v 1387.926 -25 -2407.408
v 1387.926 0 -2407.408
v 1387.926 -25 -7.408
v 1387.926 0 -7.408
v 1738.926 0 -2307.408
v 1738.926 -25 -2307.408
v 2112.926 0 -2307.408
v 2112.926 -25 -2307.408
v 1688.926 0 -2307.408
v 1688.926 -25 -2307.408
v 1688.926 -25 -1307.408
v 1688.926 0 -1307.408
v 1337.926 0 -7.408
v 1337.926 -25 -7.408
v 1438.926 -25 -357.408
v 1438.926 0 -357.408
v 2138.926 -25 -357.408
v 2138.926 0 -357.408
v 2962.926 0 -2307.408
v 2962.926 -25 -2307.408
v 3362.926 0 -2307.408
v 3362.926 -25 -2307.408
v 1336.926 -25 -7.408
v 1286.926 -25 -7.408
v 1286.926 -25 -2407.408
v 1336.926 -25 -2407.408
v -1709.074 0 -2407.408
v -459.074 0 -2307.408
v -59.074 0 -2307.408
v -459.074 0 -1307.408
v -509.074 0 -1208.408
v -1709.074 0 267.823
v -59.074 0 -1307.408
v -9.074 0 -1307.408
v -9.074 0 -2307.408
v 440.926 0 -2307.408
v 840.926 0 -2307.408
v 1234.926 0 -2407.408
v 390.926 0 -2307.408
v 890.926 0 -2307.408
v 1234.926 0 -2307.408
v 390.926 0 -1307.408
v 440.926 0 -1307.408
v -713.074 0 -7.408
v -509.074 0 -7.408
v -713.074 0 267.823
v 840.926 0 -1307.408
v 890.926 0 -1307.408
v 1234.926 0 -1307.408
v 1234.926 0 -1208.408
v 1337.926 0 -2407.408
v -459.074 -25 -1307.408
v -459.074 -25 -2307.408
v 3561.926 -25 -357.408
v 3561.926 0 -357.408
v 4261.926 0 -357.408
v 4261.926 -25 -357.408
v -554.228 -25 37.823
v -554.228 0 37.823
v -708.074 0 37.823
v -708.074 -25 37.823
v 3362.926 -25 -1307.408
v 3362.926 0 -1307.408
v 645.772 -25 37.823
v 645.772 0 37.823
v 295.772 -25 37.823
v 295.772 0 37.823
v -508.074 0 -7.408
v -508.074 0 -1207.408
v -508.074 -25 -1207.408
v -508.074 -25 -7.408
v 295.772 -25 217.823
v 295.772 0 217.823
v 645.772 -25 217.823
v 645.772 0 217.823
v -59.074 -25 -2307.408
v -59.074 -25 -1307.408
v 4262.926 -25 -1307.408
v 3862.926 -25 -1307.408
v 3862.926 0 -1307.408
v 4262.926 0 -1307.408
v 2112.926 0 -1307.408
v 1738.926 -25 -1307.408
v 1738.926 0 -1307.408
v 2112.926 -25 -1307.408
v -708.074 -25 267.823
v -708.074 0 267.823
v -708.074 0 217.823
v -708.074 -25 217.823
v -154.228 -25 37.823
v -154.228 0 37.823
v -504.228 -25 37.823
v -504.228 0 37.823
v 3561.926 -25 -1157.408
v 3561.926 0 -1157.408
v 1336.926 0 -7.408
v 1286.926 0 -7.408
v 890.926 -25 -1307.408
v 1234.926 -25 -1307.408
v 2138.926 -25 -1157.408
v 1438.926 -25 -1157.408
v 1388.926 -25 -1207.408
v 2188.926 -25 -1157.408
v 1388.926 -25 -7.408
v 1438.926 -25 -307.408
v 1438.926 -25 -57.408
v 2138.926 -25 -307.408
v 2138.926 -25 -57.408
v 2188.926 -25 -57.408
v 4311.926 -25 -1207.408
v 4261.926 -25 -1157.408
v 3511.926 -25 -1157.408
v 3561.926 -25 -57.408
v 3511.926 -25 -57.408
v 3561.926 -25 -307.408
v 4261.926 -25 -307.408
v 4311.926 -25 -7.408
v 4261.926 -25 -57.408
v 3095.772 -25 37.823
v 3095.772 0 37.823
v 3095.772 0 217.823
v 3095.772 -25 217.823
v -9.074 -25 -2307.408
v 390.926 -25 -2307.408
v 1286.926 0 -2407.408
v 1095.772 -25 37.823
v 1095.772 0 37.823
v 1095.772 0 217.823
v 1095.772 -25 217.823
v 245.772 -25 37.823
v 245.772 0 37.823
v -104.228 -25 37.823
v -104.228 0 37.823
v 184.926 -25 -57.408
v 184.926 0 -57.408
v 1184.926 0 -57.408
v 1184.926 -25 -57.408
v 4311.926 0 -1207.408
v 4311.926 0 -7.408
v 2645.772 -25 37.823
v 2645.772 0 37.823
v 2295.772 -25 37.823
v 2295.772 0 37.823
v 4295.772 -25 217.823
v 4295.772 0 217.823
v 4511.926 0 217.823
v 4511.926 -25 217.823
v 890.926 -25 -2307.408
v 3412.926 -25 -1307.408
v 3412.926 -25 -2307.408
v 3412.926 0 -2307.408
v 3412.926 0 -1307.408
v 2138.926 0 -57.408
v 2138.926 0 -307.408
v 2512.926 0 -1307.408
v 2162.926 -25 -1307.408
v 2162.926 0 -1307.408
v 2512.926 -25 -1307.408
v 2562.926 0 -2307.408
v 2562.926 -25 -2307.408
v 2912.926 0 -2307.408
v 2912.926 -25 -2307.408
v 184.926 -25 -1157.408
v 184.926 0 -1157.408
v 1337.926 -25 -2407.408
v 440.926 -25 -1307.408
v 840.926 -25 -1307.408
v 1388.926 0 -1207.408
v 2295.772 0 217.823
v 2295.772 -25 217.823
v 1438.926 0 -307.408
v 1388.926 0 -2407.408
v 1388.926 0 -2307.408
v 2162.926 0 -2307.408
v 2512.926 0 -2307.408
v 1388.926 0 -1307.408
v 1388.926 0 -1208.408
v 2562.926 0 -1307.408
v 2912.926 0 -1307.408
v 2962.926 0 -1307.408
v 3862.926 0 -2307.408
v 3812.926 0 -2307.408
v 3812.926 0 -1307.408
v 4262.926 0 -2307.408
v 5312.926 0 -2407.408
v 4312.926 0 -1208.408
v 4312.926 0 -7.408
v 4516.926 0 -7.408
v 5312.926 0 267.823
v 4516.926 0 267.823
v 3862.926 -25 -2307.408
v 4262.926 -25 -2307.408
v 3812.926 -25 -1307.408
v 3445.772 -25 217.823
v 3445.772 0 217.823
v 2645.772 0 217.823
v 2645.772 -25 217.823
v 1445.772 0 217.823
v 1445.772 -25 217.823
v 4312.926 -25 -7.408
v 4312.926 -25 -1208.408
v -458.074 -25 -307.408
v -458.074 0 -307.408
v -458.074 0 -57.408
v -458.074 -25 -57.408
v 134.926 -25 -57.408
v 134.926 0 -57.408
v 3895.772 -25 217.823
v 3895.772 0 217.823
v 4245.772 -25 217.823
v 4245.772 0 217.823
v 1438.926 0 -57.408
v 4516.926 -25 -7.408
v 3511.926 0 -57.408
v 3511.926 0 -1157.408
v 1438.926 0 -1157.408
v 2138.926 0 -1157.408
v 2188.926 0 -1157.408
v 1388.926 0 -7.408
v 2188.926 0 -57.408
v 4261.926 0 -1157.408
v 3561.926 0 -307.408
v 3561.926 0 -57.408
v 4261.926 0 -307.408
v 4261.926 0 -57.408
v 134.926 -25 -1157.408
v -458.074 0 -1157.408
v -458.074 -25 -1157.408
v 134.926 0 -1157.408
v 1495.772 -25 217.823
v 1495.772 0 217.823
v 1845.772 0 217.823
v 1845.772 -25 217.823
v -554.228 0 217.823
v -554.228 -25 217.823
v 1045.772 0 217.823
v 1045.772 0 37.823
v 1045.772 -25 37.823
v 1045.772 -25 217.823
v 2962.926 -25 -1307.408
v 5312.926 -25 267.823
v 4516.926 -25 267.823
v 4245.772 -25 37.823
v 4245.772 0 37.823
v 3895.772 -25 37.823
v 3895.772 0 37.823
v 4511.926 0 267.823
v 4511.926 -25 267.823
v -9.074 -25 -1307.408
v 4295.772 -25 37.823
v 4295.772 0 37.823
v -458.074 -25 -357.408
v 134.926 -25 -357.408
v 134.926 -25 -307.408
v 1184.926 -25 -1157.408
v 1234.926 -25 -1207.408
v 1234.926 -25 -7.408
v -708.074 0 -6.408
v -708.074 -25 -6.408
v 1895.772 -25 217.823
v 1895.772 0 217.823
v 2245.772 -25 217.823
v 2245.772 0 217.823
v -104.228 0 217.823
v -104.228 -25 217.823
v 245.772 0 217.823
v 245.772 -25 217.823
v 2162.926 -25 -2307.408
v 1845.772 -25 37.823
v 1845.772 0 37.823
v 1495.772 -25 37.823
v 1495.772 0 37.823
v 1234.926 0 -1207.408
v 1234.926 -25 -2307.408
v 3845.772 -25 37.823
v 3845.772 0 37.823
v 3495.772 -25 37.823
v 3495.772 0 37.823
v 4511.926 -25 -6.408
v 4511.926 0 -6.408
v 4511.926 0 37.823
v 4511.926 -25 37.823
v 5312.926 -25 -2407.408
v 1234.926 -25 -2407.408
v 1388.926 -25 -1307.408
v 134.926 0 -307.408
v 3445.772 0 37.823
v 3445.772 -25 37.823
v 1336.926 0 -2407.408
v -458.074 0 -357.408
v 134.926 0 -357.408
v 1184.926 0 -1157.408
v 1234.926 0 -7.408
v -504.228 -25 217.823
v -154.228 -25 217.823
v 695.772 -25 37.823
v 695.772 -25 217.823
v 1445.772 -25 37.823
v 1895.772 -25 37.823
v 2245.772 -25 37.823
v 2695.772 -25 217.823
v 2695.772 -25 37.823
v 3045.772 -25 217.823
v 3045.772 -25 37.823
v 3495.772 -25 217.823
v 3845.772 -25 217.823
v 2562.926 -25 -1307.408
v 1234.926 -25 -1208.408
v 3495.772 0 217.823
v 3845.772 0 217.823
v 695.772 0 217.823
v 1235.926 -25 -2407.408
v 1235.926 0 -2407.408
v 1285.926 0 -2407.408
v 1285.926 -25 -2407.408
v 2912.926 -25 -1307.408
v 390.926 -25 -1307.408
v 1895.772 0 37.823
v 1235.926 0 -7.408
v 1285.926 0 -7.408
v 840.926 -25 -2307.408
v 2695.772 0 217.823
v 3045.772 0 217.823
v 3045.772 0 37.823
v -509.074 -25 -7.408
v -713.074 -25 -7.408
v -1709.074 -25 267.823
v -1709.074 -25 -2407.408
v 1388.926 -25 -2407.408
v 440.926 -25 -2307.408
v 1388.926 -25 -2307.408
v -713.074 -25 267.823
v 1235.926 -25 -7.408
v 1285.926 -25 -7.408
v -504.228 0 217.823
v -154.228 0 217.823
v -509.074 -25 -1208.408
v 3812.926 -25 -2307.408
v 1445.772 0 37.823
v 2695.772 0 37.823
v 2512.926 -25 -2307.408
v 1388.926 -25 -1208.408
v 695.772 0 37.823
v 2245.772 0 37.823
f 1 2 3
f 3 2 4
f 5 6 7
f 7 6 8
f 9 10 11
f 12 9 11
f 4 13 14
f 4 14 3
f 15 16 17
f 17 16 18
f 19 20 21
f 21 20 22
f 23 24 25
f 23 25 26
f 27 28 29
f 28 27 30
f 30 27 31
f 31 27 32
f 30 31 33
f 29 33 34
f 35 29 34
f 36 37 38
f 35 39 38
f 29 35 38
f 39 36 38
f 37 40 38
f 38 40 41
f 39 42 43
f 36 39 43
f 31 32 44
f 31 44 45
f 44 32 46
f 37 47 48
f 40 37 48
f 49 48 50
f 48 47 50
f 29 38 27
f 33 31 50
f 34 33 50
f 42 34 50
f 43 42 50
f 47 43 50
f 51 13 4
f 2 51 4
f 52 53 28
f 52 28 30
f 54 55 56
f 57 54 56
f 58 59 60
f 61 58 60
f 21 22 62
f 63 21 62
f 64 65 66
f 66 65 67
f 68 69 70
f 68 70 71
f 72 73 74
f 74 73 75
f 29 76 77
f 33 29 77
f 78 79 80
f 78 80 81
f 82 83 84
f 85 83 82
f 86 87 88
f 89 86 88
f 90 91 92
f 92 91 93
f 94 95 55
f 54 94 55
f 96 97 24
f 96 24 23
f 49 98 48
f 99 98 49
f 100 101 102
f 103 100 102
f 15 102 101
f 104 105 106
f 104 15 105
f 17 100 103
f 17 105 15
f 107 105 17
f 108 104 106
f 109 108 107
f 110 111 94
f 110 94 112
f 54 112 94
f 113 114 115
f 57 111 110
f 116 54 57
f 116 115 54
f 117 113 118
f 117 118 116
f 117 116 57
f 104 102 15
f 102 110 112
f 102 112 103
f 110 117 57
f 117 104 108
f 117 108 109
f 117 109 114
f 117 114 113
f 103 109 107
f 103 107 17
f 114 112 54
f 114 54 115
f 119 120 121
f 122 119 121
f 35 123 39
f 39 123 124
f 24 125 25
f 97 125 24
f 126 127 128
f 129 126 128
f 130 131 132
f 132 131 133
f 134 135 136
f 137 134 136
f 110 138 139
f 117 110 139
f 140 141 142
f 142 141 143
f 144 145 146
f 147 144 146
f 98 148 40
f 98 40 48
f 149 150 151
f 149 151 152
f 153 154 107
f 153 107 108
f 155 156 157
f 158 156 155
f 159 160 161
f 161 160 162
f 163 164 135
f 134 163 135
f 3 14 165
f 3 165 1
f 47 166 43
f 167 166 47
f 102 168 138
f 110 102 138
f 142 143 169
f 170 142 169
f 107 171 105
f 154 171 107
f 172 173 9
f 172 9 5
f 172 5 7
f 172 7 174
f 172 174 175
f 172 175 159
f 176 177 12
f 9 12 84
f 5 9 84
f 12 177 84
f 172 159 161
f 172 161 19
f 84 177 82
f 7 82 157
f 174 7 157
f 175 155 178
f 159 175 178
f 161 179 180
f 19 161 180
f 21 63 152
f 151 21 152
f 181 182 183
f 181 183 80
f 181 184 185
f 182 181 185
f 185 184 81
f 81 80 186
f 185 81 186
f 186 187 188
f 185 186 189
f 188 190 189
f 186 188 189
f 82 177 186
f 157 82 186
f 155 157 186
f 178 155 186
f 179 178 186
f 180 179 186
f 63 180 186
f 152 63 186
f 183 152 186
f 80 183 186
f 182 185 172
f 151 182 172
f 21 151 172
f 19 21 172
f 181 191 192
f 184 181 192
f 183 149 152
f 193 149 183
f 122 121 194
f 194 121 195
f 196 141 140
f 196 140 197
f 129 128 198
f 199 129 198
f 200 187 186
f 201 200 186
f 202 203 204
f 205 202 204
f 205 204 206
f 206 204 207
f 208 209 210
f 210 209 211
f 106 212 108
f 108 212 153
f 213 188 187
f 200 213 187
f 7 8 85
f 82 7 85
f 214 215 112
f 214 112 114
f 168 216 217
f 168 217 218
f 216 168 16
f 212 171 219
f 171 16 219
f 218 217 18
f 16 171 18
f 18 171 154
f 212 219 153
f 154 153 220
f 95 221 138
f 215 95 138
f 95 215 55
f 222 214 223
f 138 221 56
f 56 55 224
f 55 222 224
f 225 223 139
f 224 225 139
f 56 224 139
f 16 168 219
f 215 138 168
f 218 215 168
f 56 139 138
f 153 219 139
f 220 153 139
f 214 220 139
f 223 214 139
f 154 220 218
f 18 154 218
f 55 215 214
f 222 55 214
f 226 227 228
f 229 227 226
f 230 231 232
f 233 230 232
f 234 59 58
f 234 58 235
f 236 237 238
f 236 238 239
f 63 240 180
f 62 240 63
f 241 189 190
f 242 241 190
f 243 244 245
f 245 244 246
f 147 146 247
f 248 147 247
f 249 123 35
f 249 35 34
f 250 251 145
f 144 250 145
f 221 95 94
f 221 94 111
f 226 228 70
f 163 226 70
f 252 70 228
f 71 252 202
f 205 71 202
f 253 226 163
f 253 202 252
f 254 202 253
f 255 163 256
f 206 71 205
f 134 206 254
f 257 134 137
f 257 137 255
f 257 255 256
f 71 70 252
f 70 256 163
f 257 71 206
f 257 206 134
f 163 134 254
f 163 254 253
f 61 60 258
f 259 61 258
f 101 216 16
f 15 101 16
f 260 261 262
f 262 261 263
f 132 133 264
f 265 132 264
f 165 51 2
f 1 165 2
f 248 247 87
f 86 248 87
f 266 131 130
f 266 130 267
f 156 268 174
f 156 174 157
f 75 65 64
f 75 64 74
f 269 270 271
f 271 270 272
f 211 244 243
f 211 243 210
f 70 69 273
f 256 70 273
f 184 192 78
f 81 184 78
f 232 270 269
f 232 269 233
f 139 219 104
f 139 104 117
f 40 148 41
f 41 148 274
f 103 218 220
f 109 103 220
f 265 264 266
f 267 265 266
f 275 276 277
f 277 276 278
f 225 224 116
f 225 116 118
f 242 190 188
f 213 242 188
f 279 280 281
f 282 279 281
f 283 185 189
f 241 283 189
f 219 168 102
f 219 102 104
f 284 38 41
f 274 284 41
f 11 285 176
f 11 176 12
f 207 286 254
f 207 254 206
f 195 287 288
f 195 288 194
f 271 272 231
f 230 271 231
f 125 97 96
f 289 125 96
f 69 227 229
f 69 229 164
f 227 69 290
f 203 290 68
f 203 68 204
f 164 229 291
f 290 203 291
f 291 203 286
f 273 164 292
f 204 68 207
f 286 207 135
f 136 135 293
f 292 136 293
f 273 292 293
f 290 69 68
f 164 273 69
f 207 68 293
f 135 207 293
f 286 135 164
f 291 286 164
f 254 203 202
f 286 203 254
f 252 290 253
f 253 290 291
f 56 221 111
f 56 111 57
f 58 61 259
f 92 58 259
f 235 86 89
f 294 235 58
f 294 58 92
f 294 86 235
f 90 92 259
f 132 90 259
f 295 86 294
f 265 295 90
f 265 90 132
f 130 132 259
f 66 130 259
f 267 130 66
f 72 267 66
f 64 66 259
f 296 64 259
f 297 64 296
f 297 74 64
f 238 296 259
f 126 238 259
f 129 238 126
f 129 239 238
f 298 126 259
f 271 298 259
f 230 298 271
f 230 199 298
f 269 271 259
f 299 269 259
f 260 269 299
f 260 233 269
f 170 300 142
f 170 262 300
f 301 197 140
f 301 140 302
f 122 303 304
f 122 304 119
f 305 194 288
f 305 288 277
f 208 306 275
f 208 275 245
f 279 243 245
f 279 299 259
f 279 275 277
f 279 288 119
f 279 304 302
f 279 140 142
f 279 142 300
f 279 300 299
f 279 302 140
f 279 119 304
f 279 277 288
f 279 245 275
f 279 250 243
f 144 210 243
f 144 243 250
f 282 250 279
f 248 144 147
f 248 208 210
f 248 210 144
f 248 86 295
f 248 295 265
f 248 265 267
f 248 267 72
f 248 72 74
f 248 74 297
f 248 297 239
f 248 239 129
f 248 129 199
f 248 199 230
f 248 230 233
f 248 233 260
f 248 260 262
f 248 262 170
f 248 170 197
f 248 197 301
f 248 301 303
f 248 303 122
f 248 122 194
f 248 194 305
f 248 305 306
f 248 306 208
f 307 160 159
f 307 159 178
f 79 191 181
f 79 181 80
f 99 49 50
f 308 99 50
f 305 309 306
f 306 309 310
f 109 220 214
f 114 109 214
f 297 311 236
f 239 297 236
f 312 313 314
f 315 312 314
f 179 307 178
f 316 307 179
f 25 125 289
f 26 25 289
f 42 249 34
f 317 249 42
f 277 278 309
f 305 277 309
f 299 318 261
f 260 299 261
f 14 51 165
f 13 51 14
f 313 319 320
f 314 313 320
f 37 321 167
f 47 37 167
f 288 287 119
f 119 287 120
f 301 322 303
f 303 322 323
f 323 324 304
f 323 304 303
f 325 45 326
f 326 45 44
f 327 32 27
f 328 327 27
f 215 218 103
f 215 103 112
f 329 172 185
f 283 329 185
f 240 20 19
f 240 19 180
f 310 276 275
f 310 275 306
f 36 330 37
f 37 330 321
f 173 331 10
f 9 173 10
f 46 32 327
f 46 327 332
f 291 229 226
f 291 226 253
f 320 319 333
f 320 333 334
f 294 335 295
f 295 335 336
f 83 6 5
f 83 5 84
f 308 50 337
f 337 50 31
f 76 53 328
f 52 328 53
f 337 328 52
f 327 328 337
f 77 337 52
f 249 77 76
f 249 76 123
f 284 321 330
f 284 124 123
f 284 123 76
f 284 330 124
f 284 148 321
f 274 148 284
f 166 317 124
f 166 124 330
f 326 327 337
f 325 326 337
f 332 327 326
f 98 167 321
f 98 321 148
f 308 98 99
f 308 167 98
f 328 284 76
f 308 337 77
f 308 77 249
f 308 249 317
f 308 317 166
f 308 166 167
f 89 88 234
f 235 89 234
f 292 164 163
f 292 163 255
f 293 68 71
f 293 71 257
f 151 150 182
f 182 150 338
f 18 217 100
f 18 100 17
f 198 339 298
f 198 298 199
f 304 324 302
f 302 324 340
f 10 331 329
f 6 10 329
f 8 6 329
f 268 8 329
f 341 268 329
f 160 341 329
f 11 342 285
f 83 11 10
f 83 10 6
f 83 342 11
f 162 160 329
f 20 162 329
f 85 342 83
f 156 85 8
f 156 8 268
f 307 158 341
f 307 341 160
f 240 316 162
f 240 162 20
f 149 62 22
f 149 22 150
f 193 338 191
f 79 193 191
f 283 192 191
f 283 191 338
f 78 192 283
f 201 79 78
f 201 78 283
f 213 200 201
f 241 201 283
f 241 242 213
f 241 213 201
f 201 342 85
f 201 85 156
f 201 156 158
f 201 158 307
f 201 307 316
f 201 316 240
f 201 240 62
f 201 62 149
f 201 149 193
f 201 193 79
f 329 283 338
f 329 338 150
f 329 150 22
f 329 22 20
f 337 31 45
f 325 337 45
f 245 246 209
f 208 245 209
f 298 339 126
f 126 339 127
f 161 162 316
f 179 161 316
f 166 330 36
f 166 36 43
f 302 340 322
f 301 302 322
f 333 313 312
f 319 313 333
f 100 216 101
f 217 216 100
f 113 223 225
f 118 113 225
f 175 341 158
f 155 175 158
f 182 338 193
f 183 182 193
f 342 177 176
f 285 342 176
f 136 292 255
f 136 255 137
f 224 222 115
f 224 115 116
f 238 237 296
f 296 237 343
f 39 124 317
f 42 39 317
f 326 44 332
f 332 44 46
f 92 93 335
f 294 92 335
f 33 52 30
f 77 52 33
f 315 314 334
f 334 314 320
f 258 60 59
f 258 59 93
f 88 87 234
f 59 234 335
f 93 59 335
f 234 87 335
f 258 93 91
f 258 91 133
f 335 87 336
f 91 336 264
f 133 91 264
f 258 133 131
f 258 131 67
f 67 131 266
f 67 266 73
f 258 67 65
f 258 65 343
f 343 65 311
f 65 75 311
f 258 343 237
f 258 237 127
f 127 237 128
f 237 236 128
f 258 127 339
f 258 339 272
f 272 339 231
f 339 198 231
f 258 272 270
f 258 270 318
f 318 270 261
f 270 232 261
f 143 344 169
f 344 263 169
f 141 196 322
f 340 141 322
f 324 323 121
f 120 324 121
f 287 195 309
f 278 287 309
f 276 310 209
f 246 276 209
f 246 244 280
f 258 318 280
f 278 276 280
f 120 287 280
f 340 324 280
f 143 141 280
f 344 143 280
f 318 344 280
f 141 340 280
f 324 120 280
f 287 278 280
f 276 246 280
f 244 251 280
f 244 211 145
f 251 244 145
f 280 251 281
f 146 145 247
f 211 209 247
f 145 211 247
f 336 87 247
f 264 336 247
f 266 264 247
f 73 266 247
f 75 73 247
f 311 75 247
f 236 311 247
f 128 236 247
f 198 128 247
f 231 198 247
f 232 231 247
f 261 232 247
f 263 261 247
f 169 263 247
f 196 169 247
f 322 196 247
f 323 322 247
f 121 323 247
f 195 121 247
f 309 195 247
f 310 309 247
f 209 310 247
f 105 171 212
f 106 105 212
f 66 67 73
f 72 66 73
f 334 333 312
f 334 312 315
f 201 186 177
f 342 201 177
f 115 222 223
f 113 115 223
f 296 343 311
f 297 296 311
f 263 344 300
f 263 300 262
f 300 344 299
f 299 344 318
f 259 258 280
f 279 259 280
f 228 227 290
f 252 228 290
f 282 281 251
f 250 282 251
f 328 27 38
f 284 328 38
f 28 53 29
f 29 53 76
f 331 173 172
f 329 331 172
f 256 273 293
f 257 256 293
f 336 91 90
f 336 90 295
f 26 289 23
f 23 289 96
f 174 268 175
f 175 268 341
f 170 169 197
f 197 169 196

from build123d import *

# Parameters (mm, degrees)
F0_W      = 50
F0_H      = 180
F1_DEPTH  = 25
F2_W      = 50
F2_H      = 2400
F3_DEPTH  = 25
F4_W      = 1743
F4_H      = 1200
F4_W_2    = 593
F4_H_2    = 800
F4_W_3    = 1000
F4_H_3    = 1100
F4_H_4    = 250
F5_DEPTH  = 25
F6_W      = 996
F6_H      = 275.2307936182
F7_DEPTH  = 25
F8_W      = 2923
F8_H      = 1200
F8_W_2    = 700
F8_H_2    = 800
F8_H_3    = 250
F8_W_3    = 1323
F8_H_4    = 1100
F9_DEPTH  = 25
F11_DEPTH = 25
F12_W     = 400
F12_H     = 1000
F12_W_2   = 344
F12_W_3   = 374
F12_W_4   = 350
F12_W_5   = 300
F13_DEPTH = 25


with BuildPart() as f1:
    # F0 (on Front) → F1 (new body)
    with BuildSketch(Plane.XZ):
        with Locations((-529.2276785159, 127.8227480803)):
            Rectangle(F0_W, F0_H)
        Polygon((4511.9260993531, 267.8227480803), (-708.0739006469, 267.8227480803), (-708.0739006469, 217.8227480803), (-554.2276785159, 217.8227480803), (-504.2276785159, 217.8227480803), (-154.2276785159, 217.8227480803), (-104.2276785159, 217.8227480803), (245.7723214841, 217.8227480803), (295.7723214841, 217.8227480803), (645.7723214841, 217.8227480803), (695.7723214841, 217.8227480803), (1045.7723214841, 217.8227480803), (1095.7723214841, 217.8227480803), (1445.7723214841, 217.8227480803), (1495.7723214841, 217.8227480803), (1845.7723214841, 217.8227480803), (1895.7723214841, 217.8227480803), (2245.7723214841, 217.8227480803), (2295.7723214841, 217.8227480803), (2645.7723214841, 217.8227480803), (2695.7723214841, 217.8227480803), (3045.7723214841, 217.8227480803), (3095.7723214841, 217.8227480803), (3445.7723214841, 217.8227480803), (3495.7723214841, 217.8227480803), (3845.7723214841, 217.8227480803), (3895.7723214841, 217.8227480803), (4245.7723214841, 217.8227480803), (4295.7723214841, 217.8227480803), (4511.9260993531, 217.8227480803), align=None)
        Polygon((-504.2276785159, 37.8227480803), (-554.2276785159, 37.8227480803), (-708.0739006469, 37.8227480803), (-708.0739006469, -6.4080455378), (4511.9260993531, -6.4080455378), (4511.9260993531, 37.8227480803), (4295.7723214841, 37.8227480803), (4245.7723214841, 37.8227480803), (3895.7723214841, 37.8227480803), (3845.7723214841, 37.8227480803), (3495.7723214841, 37.8227480803), (3445.7723214841, 37.8227480803), (3095.7723214841, 37.8227480803), (3045.7723214841, 37.8227480803), (2695.7723214841, 37.8227480803), (2645.7723214841, 37.8227480803), (2295.7723214841, 37.8227480803), (2245.7723214841, 37.8227480803), (1895.7723214841, 37.8227480803), (1845.7723214841, 37.8227480803), (1495.7723214841, 37.8227480803), (1445.7723214841, 37.8227480803), (1095.7723214841, 37.8227480803), (1045.7723214841, 37.8227480803), (695.7723214841, 37.8227480803), (645.7723214841, 37.8227480803), (295.7723214841, 37.8227480803), (245.7723214841, 37.8227480803), (-104.2276785159, 37.8227480803), (-154.2276785159, 37.8227480803), align=None)
        with Locations((-129.2276785159, 127.8227480803)):
            Rectangle(F0_W, F0_H)
        with Locations((270.7723214841, 127.8227480803)):
            Rectangle(F0_W, F0_H)
        with Locations((670.7723214841, 127.8227480803)):
            Rectangle(F0_W, F0_H)
        with Locations((1070.7723214841, 127.8227480803)):
            Rectangle(F0_W, F0_H)
        with Locations((1470.7723214841, 127.8227480803)):
            Rectangle(F0_W, F0_H)
        with Locations((1870.7723214841, 127.8227480803)):
            Rectangle(F0_W, F0_H)
        with Locations((2270.7723214841, 127.8227480803)):
            Rectangle(F0_W, F0_H)
        with Locations((2670.7723214841, 127.8227480803)):
            Rectangle(F0_W, F0_H)
        with Locations((3070.7723214841, 127.8227480803)):
            Rectangle(F0_W, F0_H)
        with Locations((3470.7723214841, 127.8227480803)):
            Rectangle(F0_W, F0_H)
        with Locations((3870.7723214841, 127.8227480803)):
            Rectangle(F0_W, F0_H)
        with Locations((4270.7723214841, 127.8227480803)):
            Rectangle(F0_W, F0_H)
    extrude(amount=F1_DEPTH)


with BuildPart() as f3:
    # F2 (on Front) → F3 (new body)
    with BuildSketch(Plane.XZ):
        with Locations((1260.9260993531, -1207.4080455378)):
            Rectangle(F2_W, F2_H)
    extrude(amount=F3_DEPTH)


with BuildPart() as f3b:
    # F2 (on Front) → F3, piece 2 (new body)
    with BuildSketch(Plane.XZ):
        with Locations((1311.9260993531, -1207.4080455378)):
            Rectangle(F2_W, F2_H)
    extrude(amount=F3_DEPTH)


with BuildPart() as f3c:
    # F2 (on Front) → F3, piece 3 (new body)
    with BuildSketch(Plane.XZ):
        with Locations((1362.9260993531, -1207.4080455378)):
            Rectangle(F2_W, F2_H)
    extrude(amount=F3_DEPTH)


with BuildPart() as f5:
    # F4 (on Front) → F5 (new body)
    with BuildSketch(Plane.XZ):
        with Locations((363.4260993531, -607.4080455378)):
            Rectangle(F4_W, F4_H)
        with Locations((-161.5739006469, -757.4080455378)):
            Rectangle(F4_W_2, F4_H_2, mode=Mode.SUBTRACT)
        with Locations((684.9260993531, -607.4080455378)):
            Rectangle(F4_W_3, F4_H_3, mode=Mode.SUBTRACT)
        with Locations((-161.5739006469, -182.4080455378)):
            Rectangle(F4_W_2, F4_H_4, mode=Mode.SUBTRACT)
    extrude(amount=F5_DEPTH)


with BuildPart() as f7:
    # F6 (on Front) → F7 (new body)
    with BuildSketch(Plane.XZ):
        with Locations((-1211.0739006469, 130.2073512713)):
            Rectangle(F6_W, F6_H)
        Polygon((-713.0739006469, -7.4080455378), (-1709.0739006469, -7.4080455378), (-1709.0739006469, -2407.4080455378), (1234.9260993531, -2407.4080455378), (1234.9260993531, -1208.4080455378), (-509.0739006469, -1208.4080455378), (-509.0739006469, -7.4080455378), align=None)
    extrude(amount=F7_DEPTH)


with BuildPart() as f9:
    # F8 (on Front) → F9 (new body)
    with BuildSketch(Plane.XZ):
        with Locations((2850.4260993531, -607.4080455378)):
            Rectangle(F8_W, F8_H)
        with Locations((1788.9260993531, -757.4080455378)):
            Rectangle(F8_W_2, F8_H_2, mode=Mode.SUBTRACT)
        with Locations((3911.9260993531, -757.4080455378)):
            Rectangle(F8_W_2, F8_H_2, mode=Mode.SUBTRACT)
        with Locations((1788.9260993531, -182.4080455378)):
            Rectangle(F8_W_2, F8_H_3, mode=Mode.SUBTRACT)
        with Locations((2850.4260993531, -607.4080455378)):
            Rectangle(F8_W_3, F8_H_4, mode=Mode.SUBTRACT)
        with Locations((3911.9260993531, -182.4080455378)):
            Rectangle(F8_W_2, F8_H_3, mode=Mode.SUBTRACT)
    extrude(amount=F9_DEPTH)


with BuildPart() as f11:
    # F10 (on Front) → F11 (new body)
    with BuildSketch(Plane.XZ):
        Polygon((4312.9260993531, -1208.4080455378), (1388.9260993531, -1208.4080455378), (1388.9260993531, -2407.4080455378), (5312.9260993531, -2407.4080455378), (5312.9260993531, 267.8227480803), (4516.9260993531, 267.8227480803), (4516.9260993531, -7.4080455378), (4312.9260993531, -7.4080455378), align=None)
    extrude(amount=F11_DEPTH)


with BuildPart() as f13_tool:
    # F12 (on face) → F13 (new body)
    with BuildSketch(Plane.XZ.offset(25)):
        with Locations((190.9260993531, -1807.4080455378)):
            Rectangle(F12_W, F12_H)
        with Locations((-259.0739006469, -1807.4080455378)):
            Rectangle(F12_W, F12_H)
        with Locations((640.9260993531, -1807.4080455378)):
            Rectangle(F12_W, F12_H)
        with Locations((1062.9260993531, -1807.4080455378)):
            Rectangle(F12_W_2, F12_H)
        with Locations((1925.9260993531, -1807.4080455378)):
            Rectangle(F12_W_3, F12_H)
        with Locations((2337.9260993531, -1807.4080455378)):
            Rectangle(F12_W_4, F12_H)
        with Locations((2737.9260993531, -1807.4080455378)):
            Rectangle(F12_W_4, F12_H)
        with Locations((3162.9260993531, -1807.4080455378)):
            Rectangle(F12_W, F12_H)
        with Locations((3612.9260993531, -1807.4080455378)):
            Rectangle(F12_W, F12_H)
        with Locations((4062.9260993531, -1807.4080455378)):
            Rectangle(F12_W, F12_H)
        with Locations((1538.9260993531, -1807.4080455378)):
            Rectangle(F12_W_5, F12_H)
    extrude(amount=-F13_DEPTH)


with BuildPart() as f7_1:
    add(f7.part)

    # F13: cut by f13_tool
    add(f13_tool.part, mode=Mode.SUBTRACT)


with BuildPart() as f11_1:
    add(f11.part)

    # F13: cut by f13_tool
    add(f13_tool.part, mode=Mode.SUBTRACT)


solid = Compound([f1.part, f3.part, f3b.part, f3c.part, f5.part, f9.part, f7_1.part, f11_1.part])
